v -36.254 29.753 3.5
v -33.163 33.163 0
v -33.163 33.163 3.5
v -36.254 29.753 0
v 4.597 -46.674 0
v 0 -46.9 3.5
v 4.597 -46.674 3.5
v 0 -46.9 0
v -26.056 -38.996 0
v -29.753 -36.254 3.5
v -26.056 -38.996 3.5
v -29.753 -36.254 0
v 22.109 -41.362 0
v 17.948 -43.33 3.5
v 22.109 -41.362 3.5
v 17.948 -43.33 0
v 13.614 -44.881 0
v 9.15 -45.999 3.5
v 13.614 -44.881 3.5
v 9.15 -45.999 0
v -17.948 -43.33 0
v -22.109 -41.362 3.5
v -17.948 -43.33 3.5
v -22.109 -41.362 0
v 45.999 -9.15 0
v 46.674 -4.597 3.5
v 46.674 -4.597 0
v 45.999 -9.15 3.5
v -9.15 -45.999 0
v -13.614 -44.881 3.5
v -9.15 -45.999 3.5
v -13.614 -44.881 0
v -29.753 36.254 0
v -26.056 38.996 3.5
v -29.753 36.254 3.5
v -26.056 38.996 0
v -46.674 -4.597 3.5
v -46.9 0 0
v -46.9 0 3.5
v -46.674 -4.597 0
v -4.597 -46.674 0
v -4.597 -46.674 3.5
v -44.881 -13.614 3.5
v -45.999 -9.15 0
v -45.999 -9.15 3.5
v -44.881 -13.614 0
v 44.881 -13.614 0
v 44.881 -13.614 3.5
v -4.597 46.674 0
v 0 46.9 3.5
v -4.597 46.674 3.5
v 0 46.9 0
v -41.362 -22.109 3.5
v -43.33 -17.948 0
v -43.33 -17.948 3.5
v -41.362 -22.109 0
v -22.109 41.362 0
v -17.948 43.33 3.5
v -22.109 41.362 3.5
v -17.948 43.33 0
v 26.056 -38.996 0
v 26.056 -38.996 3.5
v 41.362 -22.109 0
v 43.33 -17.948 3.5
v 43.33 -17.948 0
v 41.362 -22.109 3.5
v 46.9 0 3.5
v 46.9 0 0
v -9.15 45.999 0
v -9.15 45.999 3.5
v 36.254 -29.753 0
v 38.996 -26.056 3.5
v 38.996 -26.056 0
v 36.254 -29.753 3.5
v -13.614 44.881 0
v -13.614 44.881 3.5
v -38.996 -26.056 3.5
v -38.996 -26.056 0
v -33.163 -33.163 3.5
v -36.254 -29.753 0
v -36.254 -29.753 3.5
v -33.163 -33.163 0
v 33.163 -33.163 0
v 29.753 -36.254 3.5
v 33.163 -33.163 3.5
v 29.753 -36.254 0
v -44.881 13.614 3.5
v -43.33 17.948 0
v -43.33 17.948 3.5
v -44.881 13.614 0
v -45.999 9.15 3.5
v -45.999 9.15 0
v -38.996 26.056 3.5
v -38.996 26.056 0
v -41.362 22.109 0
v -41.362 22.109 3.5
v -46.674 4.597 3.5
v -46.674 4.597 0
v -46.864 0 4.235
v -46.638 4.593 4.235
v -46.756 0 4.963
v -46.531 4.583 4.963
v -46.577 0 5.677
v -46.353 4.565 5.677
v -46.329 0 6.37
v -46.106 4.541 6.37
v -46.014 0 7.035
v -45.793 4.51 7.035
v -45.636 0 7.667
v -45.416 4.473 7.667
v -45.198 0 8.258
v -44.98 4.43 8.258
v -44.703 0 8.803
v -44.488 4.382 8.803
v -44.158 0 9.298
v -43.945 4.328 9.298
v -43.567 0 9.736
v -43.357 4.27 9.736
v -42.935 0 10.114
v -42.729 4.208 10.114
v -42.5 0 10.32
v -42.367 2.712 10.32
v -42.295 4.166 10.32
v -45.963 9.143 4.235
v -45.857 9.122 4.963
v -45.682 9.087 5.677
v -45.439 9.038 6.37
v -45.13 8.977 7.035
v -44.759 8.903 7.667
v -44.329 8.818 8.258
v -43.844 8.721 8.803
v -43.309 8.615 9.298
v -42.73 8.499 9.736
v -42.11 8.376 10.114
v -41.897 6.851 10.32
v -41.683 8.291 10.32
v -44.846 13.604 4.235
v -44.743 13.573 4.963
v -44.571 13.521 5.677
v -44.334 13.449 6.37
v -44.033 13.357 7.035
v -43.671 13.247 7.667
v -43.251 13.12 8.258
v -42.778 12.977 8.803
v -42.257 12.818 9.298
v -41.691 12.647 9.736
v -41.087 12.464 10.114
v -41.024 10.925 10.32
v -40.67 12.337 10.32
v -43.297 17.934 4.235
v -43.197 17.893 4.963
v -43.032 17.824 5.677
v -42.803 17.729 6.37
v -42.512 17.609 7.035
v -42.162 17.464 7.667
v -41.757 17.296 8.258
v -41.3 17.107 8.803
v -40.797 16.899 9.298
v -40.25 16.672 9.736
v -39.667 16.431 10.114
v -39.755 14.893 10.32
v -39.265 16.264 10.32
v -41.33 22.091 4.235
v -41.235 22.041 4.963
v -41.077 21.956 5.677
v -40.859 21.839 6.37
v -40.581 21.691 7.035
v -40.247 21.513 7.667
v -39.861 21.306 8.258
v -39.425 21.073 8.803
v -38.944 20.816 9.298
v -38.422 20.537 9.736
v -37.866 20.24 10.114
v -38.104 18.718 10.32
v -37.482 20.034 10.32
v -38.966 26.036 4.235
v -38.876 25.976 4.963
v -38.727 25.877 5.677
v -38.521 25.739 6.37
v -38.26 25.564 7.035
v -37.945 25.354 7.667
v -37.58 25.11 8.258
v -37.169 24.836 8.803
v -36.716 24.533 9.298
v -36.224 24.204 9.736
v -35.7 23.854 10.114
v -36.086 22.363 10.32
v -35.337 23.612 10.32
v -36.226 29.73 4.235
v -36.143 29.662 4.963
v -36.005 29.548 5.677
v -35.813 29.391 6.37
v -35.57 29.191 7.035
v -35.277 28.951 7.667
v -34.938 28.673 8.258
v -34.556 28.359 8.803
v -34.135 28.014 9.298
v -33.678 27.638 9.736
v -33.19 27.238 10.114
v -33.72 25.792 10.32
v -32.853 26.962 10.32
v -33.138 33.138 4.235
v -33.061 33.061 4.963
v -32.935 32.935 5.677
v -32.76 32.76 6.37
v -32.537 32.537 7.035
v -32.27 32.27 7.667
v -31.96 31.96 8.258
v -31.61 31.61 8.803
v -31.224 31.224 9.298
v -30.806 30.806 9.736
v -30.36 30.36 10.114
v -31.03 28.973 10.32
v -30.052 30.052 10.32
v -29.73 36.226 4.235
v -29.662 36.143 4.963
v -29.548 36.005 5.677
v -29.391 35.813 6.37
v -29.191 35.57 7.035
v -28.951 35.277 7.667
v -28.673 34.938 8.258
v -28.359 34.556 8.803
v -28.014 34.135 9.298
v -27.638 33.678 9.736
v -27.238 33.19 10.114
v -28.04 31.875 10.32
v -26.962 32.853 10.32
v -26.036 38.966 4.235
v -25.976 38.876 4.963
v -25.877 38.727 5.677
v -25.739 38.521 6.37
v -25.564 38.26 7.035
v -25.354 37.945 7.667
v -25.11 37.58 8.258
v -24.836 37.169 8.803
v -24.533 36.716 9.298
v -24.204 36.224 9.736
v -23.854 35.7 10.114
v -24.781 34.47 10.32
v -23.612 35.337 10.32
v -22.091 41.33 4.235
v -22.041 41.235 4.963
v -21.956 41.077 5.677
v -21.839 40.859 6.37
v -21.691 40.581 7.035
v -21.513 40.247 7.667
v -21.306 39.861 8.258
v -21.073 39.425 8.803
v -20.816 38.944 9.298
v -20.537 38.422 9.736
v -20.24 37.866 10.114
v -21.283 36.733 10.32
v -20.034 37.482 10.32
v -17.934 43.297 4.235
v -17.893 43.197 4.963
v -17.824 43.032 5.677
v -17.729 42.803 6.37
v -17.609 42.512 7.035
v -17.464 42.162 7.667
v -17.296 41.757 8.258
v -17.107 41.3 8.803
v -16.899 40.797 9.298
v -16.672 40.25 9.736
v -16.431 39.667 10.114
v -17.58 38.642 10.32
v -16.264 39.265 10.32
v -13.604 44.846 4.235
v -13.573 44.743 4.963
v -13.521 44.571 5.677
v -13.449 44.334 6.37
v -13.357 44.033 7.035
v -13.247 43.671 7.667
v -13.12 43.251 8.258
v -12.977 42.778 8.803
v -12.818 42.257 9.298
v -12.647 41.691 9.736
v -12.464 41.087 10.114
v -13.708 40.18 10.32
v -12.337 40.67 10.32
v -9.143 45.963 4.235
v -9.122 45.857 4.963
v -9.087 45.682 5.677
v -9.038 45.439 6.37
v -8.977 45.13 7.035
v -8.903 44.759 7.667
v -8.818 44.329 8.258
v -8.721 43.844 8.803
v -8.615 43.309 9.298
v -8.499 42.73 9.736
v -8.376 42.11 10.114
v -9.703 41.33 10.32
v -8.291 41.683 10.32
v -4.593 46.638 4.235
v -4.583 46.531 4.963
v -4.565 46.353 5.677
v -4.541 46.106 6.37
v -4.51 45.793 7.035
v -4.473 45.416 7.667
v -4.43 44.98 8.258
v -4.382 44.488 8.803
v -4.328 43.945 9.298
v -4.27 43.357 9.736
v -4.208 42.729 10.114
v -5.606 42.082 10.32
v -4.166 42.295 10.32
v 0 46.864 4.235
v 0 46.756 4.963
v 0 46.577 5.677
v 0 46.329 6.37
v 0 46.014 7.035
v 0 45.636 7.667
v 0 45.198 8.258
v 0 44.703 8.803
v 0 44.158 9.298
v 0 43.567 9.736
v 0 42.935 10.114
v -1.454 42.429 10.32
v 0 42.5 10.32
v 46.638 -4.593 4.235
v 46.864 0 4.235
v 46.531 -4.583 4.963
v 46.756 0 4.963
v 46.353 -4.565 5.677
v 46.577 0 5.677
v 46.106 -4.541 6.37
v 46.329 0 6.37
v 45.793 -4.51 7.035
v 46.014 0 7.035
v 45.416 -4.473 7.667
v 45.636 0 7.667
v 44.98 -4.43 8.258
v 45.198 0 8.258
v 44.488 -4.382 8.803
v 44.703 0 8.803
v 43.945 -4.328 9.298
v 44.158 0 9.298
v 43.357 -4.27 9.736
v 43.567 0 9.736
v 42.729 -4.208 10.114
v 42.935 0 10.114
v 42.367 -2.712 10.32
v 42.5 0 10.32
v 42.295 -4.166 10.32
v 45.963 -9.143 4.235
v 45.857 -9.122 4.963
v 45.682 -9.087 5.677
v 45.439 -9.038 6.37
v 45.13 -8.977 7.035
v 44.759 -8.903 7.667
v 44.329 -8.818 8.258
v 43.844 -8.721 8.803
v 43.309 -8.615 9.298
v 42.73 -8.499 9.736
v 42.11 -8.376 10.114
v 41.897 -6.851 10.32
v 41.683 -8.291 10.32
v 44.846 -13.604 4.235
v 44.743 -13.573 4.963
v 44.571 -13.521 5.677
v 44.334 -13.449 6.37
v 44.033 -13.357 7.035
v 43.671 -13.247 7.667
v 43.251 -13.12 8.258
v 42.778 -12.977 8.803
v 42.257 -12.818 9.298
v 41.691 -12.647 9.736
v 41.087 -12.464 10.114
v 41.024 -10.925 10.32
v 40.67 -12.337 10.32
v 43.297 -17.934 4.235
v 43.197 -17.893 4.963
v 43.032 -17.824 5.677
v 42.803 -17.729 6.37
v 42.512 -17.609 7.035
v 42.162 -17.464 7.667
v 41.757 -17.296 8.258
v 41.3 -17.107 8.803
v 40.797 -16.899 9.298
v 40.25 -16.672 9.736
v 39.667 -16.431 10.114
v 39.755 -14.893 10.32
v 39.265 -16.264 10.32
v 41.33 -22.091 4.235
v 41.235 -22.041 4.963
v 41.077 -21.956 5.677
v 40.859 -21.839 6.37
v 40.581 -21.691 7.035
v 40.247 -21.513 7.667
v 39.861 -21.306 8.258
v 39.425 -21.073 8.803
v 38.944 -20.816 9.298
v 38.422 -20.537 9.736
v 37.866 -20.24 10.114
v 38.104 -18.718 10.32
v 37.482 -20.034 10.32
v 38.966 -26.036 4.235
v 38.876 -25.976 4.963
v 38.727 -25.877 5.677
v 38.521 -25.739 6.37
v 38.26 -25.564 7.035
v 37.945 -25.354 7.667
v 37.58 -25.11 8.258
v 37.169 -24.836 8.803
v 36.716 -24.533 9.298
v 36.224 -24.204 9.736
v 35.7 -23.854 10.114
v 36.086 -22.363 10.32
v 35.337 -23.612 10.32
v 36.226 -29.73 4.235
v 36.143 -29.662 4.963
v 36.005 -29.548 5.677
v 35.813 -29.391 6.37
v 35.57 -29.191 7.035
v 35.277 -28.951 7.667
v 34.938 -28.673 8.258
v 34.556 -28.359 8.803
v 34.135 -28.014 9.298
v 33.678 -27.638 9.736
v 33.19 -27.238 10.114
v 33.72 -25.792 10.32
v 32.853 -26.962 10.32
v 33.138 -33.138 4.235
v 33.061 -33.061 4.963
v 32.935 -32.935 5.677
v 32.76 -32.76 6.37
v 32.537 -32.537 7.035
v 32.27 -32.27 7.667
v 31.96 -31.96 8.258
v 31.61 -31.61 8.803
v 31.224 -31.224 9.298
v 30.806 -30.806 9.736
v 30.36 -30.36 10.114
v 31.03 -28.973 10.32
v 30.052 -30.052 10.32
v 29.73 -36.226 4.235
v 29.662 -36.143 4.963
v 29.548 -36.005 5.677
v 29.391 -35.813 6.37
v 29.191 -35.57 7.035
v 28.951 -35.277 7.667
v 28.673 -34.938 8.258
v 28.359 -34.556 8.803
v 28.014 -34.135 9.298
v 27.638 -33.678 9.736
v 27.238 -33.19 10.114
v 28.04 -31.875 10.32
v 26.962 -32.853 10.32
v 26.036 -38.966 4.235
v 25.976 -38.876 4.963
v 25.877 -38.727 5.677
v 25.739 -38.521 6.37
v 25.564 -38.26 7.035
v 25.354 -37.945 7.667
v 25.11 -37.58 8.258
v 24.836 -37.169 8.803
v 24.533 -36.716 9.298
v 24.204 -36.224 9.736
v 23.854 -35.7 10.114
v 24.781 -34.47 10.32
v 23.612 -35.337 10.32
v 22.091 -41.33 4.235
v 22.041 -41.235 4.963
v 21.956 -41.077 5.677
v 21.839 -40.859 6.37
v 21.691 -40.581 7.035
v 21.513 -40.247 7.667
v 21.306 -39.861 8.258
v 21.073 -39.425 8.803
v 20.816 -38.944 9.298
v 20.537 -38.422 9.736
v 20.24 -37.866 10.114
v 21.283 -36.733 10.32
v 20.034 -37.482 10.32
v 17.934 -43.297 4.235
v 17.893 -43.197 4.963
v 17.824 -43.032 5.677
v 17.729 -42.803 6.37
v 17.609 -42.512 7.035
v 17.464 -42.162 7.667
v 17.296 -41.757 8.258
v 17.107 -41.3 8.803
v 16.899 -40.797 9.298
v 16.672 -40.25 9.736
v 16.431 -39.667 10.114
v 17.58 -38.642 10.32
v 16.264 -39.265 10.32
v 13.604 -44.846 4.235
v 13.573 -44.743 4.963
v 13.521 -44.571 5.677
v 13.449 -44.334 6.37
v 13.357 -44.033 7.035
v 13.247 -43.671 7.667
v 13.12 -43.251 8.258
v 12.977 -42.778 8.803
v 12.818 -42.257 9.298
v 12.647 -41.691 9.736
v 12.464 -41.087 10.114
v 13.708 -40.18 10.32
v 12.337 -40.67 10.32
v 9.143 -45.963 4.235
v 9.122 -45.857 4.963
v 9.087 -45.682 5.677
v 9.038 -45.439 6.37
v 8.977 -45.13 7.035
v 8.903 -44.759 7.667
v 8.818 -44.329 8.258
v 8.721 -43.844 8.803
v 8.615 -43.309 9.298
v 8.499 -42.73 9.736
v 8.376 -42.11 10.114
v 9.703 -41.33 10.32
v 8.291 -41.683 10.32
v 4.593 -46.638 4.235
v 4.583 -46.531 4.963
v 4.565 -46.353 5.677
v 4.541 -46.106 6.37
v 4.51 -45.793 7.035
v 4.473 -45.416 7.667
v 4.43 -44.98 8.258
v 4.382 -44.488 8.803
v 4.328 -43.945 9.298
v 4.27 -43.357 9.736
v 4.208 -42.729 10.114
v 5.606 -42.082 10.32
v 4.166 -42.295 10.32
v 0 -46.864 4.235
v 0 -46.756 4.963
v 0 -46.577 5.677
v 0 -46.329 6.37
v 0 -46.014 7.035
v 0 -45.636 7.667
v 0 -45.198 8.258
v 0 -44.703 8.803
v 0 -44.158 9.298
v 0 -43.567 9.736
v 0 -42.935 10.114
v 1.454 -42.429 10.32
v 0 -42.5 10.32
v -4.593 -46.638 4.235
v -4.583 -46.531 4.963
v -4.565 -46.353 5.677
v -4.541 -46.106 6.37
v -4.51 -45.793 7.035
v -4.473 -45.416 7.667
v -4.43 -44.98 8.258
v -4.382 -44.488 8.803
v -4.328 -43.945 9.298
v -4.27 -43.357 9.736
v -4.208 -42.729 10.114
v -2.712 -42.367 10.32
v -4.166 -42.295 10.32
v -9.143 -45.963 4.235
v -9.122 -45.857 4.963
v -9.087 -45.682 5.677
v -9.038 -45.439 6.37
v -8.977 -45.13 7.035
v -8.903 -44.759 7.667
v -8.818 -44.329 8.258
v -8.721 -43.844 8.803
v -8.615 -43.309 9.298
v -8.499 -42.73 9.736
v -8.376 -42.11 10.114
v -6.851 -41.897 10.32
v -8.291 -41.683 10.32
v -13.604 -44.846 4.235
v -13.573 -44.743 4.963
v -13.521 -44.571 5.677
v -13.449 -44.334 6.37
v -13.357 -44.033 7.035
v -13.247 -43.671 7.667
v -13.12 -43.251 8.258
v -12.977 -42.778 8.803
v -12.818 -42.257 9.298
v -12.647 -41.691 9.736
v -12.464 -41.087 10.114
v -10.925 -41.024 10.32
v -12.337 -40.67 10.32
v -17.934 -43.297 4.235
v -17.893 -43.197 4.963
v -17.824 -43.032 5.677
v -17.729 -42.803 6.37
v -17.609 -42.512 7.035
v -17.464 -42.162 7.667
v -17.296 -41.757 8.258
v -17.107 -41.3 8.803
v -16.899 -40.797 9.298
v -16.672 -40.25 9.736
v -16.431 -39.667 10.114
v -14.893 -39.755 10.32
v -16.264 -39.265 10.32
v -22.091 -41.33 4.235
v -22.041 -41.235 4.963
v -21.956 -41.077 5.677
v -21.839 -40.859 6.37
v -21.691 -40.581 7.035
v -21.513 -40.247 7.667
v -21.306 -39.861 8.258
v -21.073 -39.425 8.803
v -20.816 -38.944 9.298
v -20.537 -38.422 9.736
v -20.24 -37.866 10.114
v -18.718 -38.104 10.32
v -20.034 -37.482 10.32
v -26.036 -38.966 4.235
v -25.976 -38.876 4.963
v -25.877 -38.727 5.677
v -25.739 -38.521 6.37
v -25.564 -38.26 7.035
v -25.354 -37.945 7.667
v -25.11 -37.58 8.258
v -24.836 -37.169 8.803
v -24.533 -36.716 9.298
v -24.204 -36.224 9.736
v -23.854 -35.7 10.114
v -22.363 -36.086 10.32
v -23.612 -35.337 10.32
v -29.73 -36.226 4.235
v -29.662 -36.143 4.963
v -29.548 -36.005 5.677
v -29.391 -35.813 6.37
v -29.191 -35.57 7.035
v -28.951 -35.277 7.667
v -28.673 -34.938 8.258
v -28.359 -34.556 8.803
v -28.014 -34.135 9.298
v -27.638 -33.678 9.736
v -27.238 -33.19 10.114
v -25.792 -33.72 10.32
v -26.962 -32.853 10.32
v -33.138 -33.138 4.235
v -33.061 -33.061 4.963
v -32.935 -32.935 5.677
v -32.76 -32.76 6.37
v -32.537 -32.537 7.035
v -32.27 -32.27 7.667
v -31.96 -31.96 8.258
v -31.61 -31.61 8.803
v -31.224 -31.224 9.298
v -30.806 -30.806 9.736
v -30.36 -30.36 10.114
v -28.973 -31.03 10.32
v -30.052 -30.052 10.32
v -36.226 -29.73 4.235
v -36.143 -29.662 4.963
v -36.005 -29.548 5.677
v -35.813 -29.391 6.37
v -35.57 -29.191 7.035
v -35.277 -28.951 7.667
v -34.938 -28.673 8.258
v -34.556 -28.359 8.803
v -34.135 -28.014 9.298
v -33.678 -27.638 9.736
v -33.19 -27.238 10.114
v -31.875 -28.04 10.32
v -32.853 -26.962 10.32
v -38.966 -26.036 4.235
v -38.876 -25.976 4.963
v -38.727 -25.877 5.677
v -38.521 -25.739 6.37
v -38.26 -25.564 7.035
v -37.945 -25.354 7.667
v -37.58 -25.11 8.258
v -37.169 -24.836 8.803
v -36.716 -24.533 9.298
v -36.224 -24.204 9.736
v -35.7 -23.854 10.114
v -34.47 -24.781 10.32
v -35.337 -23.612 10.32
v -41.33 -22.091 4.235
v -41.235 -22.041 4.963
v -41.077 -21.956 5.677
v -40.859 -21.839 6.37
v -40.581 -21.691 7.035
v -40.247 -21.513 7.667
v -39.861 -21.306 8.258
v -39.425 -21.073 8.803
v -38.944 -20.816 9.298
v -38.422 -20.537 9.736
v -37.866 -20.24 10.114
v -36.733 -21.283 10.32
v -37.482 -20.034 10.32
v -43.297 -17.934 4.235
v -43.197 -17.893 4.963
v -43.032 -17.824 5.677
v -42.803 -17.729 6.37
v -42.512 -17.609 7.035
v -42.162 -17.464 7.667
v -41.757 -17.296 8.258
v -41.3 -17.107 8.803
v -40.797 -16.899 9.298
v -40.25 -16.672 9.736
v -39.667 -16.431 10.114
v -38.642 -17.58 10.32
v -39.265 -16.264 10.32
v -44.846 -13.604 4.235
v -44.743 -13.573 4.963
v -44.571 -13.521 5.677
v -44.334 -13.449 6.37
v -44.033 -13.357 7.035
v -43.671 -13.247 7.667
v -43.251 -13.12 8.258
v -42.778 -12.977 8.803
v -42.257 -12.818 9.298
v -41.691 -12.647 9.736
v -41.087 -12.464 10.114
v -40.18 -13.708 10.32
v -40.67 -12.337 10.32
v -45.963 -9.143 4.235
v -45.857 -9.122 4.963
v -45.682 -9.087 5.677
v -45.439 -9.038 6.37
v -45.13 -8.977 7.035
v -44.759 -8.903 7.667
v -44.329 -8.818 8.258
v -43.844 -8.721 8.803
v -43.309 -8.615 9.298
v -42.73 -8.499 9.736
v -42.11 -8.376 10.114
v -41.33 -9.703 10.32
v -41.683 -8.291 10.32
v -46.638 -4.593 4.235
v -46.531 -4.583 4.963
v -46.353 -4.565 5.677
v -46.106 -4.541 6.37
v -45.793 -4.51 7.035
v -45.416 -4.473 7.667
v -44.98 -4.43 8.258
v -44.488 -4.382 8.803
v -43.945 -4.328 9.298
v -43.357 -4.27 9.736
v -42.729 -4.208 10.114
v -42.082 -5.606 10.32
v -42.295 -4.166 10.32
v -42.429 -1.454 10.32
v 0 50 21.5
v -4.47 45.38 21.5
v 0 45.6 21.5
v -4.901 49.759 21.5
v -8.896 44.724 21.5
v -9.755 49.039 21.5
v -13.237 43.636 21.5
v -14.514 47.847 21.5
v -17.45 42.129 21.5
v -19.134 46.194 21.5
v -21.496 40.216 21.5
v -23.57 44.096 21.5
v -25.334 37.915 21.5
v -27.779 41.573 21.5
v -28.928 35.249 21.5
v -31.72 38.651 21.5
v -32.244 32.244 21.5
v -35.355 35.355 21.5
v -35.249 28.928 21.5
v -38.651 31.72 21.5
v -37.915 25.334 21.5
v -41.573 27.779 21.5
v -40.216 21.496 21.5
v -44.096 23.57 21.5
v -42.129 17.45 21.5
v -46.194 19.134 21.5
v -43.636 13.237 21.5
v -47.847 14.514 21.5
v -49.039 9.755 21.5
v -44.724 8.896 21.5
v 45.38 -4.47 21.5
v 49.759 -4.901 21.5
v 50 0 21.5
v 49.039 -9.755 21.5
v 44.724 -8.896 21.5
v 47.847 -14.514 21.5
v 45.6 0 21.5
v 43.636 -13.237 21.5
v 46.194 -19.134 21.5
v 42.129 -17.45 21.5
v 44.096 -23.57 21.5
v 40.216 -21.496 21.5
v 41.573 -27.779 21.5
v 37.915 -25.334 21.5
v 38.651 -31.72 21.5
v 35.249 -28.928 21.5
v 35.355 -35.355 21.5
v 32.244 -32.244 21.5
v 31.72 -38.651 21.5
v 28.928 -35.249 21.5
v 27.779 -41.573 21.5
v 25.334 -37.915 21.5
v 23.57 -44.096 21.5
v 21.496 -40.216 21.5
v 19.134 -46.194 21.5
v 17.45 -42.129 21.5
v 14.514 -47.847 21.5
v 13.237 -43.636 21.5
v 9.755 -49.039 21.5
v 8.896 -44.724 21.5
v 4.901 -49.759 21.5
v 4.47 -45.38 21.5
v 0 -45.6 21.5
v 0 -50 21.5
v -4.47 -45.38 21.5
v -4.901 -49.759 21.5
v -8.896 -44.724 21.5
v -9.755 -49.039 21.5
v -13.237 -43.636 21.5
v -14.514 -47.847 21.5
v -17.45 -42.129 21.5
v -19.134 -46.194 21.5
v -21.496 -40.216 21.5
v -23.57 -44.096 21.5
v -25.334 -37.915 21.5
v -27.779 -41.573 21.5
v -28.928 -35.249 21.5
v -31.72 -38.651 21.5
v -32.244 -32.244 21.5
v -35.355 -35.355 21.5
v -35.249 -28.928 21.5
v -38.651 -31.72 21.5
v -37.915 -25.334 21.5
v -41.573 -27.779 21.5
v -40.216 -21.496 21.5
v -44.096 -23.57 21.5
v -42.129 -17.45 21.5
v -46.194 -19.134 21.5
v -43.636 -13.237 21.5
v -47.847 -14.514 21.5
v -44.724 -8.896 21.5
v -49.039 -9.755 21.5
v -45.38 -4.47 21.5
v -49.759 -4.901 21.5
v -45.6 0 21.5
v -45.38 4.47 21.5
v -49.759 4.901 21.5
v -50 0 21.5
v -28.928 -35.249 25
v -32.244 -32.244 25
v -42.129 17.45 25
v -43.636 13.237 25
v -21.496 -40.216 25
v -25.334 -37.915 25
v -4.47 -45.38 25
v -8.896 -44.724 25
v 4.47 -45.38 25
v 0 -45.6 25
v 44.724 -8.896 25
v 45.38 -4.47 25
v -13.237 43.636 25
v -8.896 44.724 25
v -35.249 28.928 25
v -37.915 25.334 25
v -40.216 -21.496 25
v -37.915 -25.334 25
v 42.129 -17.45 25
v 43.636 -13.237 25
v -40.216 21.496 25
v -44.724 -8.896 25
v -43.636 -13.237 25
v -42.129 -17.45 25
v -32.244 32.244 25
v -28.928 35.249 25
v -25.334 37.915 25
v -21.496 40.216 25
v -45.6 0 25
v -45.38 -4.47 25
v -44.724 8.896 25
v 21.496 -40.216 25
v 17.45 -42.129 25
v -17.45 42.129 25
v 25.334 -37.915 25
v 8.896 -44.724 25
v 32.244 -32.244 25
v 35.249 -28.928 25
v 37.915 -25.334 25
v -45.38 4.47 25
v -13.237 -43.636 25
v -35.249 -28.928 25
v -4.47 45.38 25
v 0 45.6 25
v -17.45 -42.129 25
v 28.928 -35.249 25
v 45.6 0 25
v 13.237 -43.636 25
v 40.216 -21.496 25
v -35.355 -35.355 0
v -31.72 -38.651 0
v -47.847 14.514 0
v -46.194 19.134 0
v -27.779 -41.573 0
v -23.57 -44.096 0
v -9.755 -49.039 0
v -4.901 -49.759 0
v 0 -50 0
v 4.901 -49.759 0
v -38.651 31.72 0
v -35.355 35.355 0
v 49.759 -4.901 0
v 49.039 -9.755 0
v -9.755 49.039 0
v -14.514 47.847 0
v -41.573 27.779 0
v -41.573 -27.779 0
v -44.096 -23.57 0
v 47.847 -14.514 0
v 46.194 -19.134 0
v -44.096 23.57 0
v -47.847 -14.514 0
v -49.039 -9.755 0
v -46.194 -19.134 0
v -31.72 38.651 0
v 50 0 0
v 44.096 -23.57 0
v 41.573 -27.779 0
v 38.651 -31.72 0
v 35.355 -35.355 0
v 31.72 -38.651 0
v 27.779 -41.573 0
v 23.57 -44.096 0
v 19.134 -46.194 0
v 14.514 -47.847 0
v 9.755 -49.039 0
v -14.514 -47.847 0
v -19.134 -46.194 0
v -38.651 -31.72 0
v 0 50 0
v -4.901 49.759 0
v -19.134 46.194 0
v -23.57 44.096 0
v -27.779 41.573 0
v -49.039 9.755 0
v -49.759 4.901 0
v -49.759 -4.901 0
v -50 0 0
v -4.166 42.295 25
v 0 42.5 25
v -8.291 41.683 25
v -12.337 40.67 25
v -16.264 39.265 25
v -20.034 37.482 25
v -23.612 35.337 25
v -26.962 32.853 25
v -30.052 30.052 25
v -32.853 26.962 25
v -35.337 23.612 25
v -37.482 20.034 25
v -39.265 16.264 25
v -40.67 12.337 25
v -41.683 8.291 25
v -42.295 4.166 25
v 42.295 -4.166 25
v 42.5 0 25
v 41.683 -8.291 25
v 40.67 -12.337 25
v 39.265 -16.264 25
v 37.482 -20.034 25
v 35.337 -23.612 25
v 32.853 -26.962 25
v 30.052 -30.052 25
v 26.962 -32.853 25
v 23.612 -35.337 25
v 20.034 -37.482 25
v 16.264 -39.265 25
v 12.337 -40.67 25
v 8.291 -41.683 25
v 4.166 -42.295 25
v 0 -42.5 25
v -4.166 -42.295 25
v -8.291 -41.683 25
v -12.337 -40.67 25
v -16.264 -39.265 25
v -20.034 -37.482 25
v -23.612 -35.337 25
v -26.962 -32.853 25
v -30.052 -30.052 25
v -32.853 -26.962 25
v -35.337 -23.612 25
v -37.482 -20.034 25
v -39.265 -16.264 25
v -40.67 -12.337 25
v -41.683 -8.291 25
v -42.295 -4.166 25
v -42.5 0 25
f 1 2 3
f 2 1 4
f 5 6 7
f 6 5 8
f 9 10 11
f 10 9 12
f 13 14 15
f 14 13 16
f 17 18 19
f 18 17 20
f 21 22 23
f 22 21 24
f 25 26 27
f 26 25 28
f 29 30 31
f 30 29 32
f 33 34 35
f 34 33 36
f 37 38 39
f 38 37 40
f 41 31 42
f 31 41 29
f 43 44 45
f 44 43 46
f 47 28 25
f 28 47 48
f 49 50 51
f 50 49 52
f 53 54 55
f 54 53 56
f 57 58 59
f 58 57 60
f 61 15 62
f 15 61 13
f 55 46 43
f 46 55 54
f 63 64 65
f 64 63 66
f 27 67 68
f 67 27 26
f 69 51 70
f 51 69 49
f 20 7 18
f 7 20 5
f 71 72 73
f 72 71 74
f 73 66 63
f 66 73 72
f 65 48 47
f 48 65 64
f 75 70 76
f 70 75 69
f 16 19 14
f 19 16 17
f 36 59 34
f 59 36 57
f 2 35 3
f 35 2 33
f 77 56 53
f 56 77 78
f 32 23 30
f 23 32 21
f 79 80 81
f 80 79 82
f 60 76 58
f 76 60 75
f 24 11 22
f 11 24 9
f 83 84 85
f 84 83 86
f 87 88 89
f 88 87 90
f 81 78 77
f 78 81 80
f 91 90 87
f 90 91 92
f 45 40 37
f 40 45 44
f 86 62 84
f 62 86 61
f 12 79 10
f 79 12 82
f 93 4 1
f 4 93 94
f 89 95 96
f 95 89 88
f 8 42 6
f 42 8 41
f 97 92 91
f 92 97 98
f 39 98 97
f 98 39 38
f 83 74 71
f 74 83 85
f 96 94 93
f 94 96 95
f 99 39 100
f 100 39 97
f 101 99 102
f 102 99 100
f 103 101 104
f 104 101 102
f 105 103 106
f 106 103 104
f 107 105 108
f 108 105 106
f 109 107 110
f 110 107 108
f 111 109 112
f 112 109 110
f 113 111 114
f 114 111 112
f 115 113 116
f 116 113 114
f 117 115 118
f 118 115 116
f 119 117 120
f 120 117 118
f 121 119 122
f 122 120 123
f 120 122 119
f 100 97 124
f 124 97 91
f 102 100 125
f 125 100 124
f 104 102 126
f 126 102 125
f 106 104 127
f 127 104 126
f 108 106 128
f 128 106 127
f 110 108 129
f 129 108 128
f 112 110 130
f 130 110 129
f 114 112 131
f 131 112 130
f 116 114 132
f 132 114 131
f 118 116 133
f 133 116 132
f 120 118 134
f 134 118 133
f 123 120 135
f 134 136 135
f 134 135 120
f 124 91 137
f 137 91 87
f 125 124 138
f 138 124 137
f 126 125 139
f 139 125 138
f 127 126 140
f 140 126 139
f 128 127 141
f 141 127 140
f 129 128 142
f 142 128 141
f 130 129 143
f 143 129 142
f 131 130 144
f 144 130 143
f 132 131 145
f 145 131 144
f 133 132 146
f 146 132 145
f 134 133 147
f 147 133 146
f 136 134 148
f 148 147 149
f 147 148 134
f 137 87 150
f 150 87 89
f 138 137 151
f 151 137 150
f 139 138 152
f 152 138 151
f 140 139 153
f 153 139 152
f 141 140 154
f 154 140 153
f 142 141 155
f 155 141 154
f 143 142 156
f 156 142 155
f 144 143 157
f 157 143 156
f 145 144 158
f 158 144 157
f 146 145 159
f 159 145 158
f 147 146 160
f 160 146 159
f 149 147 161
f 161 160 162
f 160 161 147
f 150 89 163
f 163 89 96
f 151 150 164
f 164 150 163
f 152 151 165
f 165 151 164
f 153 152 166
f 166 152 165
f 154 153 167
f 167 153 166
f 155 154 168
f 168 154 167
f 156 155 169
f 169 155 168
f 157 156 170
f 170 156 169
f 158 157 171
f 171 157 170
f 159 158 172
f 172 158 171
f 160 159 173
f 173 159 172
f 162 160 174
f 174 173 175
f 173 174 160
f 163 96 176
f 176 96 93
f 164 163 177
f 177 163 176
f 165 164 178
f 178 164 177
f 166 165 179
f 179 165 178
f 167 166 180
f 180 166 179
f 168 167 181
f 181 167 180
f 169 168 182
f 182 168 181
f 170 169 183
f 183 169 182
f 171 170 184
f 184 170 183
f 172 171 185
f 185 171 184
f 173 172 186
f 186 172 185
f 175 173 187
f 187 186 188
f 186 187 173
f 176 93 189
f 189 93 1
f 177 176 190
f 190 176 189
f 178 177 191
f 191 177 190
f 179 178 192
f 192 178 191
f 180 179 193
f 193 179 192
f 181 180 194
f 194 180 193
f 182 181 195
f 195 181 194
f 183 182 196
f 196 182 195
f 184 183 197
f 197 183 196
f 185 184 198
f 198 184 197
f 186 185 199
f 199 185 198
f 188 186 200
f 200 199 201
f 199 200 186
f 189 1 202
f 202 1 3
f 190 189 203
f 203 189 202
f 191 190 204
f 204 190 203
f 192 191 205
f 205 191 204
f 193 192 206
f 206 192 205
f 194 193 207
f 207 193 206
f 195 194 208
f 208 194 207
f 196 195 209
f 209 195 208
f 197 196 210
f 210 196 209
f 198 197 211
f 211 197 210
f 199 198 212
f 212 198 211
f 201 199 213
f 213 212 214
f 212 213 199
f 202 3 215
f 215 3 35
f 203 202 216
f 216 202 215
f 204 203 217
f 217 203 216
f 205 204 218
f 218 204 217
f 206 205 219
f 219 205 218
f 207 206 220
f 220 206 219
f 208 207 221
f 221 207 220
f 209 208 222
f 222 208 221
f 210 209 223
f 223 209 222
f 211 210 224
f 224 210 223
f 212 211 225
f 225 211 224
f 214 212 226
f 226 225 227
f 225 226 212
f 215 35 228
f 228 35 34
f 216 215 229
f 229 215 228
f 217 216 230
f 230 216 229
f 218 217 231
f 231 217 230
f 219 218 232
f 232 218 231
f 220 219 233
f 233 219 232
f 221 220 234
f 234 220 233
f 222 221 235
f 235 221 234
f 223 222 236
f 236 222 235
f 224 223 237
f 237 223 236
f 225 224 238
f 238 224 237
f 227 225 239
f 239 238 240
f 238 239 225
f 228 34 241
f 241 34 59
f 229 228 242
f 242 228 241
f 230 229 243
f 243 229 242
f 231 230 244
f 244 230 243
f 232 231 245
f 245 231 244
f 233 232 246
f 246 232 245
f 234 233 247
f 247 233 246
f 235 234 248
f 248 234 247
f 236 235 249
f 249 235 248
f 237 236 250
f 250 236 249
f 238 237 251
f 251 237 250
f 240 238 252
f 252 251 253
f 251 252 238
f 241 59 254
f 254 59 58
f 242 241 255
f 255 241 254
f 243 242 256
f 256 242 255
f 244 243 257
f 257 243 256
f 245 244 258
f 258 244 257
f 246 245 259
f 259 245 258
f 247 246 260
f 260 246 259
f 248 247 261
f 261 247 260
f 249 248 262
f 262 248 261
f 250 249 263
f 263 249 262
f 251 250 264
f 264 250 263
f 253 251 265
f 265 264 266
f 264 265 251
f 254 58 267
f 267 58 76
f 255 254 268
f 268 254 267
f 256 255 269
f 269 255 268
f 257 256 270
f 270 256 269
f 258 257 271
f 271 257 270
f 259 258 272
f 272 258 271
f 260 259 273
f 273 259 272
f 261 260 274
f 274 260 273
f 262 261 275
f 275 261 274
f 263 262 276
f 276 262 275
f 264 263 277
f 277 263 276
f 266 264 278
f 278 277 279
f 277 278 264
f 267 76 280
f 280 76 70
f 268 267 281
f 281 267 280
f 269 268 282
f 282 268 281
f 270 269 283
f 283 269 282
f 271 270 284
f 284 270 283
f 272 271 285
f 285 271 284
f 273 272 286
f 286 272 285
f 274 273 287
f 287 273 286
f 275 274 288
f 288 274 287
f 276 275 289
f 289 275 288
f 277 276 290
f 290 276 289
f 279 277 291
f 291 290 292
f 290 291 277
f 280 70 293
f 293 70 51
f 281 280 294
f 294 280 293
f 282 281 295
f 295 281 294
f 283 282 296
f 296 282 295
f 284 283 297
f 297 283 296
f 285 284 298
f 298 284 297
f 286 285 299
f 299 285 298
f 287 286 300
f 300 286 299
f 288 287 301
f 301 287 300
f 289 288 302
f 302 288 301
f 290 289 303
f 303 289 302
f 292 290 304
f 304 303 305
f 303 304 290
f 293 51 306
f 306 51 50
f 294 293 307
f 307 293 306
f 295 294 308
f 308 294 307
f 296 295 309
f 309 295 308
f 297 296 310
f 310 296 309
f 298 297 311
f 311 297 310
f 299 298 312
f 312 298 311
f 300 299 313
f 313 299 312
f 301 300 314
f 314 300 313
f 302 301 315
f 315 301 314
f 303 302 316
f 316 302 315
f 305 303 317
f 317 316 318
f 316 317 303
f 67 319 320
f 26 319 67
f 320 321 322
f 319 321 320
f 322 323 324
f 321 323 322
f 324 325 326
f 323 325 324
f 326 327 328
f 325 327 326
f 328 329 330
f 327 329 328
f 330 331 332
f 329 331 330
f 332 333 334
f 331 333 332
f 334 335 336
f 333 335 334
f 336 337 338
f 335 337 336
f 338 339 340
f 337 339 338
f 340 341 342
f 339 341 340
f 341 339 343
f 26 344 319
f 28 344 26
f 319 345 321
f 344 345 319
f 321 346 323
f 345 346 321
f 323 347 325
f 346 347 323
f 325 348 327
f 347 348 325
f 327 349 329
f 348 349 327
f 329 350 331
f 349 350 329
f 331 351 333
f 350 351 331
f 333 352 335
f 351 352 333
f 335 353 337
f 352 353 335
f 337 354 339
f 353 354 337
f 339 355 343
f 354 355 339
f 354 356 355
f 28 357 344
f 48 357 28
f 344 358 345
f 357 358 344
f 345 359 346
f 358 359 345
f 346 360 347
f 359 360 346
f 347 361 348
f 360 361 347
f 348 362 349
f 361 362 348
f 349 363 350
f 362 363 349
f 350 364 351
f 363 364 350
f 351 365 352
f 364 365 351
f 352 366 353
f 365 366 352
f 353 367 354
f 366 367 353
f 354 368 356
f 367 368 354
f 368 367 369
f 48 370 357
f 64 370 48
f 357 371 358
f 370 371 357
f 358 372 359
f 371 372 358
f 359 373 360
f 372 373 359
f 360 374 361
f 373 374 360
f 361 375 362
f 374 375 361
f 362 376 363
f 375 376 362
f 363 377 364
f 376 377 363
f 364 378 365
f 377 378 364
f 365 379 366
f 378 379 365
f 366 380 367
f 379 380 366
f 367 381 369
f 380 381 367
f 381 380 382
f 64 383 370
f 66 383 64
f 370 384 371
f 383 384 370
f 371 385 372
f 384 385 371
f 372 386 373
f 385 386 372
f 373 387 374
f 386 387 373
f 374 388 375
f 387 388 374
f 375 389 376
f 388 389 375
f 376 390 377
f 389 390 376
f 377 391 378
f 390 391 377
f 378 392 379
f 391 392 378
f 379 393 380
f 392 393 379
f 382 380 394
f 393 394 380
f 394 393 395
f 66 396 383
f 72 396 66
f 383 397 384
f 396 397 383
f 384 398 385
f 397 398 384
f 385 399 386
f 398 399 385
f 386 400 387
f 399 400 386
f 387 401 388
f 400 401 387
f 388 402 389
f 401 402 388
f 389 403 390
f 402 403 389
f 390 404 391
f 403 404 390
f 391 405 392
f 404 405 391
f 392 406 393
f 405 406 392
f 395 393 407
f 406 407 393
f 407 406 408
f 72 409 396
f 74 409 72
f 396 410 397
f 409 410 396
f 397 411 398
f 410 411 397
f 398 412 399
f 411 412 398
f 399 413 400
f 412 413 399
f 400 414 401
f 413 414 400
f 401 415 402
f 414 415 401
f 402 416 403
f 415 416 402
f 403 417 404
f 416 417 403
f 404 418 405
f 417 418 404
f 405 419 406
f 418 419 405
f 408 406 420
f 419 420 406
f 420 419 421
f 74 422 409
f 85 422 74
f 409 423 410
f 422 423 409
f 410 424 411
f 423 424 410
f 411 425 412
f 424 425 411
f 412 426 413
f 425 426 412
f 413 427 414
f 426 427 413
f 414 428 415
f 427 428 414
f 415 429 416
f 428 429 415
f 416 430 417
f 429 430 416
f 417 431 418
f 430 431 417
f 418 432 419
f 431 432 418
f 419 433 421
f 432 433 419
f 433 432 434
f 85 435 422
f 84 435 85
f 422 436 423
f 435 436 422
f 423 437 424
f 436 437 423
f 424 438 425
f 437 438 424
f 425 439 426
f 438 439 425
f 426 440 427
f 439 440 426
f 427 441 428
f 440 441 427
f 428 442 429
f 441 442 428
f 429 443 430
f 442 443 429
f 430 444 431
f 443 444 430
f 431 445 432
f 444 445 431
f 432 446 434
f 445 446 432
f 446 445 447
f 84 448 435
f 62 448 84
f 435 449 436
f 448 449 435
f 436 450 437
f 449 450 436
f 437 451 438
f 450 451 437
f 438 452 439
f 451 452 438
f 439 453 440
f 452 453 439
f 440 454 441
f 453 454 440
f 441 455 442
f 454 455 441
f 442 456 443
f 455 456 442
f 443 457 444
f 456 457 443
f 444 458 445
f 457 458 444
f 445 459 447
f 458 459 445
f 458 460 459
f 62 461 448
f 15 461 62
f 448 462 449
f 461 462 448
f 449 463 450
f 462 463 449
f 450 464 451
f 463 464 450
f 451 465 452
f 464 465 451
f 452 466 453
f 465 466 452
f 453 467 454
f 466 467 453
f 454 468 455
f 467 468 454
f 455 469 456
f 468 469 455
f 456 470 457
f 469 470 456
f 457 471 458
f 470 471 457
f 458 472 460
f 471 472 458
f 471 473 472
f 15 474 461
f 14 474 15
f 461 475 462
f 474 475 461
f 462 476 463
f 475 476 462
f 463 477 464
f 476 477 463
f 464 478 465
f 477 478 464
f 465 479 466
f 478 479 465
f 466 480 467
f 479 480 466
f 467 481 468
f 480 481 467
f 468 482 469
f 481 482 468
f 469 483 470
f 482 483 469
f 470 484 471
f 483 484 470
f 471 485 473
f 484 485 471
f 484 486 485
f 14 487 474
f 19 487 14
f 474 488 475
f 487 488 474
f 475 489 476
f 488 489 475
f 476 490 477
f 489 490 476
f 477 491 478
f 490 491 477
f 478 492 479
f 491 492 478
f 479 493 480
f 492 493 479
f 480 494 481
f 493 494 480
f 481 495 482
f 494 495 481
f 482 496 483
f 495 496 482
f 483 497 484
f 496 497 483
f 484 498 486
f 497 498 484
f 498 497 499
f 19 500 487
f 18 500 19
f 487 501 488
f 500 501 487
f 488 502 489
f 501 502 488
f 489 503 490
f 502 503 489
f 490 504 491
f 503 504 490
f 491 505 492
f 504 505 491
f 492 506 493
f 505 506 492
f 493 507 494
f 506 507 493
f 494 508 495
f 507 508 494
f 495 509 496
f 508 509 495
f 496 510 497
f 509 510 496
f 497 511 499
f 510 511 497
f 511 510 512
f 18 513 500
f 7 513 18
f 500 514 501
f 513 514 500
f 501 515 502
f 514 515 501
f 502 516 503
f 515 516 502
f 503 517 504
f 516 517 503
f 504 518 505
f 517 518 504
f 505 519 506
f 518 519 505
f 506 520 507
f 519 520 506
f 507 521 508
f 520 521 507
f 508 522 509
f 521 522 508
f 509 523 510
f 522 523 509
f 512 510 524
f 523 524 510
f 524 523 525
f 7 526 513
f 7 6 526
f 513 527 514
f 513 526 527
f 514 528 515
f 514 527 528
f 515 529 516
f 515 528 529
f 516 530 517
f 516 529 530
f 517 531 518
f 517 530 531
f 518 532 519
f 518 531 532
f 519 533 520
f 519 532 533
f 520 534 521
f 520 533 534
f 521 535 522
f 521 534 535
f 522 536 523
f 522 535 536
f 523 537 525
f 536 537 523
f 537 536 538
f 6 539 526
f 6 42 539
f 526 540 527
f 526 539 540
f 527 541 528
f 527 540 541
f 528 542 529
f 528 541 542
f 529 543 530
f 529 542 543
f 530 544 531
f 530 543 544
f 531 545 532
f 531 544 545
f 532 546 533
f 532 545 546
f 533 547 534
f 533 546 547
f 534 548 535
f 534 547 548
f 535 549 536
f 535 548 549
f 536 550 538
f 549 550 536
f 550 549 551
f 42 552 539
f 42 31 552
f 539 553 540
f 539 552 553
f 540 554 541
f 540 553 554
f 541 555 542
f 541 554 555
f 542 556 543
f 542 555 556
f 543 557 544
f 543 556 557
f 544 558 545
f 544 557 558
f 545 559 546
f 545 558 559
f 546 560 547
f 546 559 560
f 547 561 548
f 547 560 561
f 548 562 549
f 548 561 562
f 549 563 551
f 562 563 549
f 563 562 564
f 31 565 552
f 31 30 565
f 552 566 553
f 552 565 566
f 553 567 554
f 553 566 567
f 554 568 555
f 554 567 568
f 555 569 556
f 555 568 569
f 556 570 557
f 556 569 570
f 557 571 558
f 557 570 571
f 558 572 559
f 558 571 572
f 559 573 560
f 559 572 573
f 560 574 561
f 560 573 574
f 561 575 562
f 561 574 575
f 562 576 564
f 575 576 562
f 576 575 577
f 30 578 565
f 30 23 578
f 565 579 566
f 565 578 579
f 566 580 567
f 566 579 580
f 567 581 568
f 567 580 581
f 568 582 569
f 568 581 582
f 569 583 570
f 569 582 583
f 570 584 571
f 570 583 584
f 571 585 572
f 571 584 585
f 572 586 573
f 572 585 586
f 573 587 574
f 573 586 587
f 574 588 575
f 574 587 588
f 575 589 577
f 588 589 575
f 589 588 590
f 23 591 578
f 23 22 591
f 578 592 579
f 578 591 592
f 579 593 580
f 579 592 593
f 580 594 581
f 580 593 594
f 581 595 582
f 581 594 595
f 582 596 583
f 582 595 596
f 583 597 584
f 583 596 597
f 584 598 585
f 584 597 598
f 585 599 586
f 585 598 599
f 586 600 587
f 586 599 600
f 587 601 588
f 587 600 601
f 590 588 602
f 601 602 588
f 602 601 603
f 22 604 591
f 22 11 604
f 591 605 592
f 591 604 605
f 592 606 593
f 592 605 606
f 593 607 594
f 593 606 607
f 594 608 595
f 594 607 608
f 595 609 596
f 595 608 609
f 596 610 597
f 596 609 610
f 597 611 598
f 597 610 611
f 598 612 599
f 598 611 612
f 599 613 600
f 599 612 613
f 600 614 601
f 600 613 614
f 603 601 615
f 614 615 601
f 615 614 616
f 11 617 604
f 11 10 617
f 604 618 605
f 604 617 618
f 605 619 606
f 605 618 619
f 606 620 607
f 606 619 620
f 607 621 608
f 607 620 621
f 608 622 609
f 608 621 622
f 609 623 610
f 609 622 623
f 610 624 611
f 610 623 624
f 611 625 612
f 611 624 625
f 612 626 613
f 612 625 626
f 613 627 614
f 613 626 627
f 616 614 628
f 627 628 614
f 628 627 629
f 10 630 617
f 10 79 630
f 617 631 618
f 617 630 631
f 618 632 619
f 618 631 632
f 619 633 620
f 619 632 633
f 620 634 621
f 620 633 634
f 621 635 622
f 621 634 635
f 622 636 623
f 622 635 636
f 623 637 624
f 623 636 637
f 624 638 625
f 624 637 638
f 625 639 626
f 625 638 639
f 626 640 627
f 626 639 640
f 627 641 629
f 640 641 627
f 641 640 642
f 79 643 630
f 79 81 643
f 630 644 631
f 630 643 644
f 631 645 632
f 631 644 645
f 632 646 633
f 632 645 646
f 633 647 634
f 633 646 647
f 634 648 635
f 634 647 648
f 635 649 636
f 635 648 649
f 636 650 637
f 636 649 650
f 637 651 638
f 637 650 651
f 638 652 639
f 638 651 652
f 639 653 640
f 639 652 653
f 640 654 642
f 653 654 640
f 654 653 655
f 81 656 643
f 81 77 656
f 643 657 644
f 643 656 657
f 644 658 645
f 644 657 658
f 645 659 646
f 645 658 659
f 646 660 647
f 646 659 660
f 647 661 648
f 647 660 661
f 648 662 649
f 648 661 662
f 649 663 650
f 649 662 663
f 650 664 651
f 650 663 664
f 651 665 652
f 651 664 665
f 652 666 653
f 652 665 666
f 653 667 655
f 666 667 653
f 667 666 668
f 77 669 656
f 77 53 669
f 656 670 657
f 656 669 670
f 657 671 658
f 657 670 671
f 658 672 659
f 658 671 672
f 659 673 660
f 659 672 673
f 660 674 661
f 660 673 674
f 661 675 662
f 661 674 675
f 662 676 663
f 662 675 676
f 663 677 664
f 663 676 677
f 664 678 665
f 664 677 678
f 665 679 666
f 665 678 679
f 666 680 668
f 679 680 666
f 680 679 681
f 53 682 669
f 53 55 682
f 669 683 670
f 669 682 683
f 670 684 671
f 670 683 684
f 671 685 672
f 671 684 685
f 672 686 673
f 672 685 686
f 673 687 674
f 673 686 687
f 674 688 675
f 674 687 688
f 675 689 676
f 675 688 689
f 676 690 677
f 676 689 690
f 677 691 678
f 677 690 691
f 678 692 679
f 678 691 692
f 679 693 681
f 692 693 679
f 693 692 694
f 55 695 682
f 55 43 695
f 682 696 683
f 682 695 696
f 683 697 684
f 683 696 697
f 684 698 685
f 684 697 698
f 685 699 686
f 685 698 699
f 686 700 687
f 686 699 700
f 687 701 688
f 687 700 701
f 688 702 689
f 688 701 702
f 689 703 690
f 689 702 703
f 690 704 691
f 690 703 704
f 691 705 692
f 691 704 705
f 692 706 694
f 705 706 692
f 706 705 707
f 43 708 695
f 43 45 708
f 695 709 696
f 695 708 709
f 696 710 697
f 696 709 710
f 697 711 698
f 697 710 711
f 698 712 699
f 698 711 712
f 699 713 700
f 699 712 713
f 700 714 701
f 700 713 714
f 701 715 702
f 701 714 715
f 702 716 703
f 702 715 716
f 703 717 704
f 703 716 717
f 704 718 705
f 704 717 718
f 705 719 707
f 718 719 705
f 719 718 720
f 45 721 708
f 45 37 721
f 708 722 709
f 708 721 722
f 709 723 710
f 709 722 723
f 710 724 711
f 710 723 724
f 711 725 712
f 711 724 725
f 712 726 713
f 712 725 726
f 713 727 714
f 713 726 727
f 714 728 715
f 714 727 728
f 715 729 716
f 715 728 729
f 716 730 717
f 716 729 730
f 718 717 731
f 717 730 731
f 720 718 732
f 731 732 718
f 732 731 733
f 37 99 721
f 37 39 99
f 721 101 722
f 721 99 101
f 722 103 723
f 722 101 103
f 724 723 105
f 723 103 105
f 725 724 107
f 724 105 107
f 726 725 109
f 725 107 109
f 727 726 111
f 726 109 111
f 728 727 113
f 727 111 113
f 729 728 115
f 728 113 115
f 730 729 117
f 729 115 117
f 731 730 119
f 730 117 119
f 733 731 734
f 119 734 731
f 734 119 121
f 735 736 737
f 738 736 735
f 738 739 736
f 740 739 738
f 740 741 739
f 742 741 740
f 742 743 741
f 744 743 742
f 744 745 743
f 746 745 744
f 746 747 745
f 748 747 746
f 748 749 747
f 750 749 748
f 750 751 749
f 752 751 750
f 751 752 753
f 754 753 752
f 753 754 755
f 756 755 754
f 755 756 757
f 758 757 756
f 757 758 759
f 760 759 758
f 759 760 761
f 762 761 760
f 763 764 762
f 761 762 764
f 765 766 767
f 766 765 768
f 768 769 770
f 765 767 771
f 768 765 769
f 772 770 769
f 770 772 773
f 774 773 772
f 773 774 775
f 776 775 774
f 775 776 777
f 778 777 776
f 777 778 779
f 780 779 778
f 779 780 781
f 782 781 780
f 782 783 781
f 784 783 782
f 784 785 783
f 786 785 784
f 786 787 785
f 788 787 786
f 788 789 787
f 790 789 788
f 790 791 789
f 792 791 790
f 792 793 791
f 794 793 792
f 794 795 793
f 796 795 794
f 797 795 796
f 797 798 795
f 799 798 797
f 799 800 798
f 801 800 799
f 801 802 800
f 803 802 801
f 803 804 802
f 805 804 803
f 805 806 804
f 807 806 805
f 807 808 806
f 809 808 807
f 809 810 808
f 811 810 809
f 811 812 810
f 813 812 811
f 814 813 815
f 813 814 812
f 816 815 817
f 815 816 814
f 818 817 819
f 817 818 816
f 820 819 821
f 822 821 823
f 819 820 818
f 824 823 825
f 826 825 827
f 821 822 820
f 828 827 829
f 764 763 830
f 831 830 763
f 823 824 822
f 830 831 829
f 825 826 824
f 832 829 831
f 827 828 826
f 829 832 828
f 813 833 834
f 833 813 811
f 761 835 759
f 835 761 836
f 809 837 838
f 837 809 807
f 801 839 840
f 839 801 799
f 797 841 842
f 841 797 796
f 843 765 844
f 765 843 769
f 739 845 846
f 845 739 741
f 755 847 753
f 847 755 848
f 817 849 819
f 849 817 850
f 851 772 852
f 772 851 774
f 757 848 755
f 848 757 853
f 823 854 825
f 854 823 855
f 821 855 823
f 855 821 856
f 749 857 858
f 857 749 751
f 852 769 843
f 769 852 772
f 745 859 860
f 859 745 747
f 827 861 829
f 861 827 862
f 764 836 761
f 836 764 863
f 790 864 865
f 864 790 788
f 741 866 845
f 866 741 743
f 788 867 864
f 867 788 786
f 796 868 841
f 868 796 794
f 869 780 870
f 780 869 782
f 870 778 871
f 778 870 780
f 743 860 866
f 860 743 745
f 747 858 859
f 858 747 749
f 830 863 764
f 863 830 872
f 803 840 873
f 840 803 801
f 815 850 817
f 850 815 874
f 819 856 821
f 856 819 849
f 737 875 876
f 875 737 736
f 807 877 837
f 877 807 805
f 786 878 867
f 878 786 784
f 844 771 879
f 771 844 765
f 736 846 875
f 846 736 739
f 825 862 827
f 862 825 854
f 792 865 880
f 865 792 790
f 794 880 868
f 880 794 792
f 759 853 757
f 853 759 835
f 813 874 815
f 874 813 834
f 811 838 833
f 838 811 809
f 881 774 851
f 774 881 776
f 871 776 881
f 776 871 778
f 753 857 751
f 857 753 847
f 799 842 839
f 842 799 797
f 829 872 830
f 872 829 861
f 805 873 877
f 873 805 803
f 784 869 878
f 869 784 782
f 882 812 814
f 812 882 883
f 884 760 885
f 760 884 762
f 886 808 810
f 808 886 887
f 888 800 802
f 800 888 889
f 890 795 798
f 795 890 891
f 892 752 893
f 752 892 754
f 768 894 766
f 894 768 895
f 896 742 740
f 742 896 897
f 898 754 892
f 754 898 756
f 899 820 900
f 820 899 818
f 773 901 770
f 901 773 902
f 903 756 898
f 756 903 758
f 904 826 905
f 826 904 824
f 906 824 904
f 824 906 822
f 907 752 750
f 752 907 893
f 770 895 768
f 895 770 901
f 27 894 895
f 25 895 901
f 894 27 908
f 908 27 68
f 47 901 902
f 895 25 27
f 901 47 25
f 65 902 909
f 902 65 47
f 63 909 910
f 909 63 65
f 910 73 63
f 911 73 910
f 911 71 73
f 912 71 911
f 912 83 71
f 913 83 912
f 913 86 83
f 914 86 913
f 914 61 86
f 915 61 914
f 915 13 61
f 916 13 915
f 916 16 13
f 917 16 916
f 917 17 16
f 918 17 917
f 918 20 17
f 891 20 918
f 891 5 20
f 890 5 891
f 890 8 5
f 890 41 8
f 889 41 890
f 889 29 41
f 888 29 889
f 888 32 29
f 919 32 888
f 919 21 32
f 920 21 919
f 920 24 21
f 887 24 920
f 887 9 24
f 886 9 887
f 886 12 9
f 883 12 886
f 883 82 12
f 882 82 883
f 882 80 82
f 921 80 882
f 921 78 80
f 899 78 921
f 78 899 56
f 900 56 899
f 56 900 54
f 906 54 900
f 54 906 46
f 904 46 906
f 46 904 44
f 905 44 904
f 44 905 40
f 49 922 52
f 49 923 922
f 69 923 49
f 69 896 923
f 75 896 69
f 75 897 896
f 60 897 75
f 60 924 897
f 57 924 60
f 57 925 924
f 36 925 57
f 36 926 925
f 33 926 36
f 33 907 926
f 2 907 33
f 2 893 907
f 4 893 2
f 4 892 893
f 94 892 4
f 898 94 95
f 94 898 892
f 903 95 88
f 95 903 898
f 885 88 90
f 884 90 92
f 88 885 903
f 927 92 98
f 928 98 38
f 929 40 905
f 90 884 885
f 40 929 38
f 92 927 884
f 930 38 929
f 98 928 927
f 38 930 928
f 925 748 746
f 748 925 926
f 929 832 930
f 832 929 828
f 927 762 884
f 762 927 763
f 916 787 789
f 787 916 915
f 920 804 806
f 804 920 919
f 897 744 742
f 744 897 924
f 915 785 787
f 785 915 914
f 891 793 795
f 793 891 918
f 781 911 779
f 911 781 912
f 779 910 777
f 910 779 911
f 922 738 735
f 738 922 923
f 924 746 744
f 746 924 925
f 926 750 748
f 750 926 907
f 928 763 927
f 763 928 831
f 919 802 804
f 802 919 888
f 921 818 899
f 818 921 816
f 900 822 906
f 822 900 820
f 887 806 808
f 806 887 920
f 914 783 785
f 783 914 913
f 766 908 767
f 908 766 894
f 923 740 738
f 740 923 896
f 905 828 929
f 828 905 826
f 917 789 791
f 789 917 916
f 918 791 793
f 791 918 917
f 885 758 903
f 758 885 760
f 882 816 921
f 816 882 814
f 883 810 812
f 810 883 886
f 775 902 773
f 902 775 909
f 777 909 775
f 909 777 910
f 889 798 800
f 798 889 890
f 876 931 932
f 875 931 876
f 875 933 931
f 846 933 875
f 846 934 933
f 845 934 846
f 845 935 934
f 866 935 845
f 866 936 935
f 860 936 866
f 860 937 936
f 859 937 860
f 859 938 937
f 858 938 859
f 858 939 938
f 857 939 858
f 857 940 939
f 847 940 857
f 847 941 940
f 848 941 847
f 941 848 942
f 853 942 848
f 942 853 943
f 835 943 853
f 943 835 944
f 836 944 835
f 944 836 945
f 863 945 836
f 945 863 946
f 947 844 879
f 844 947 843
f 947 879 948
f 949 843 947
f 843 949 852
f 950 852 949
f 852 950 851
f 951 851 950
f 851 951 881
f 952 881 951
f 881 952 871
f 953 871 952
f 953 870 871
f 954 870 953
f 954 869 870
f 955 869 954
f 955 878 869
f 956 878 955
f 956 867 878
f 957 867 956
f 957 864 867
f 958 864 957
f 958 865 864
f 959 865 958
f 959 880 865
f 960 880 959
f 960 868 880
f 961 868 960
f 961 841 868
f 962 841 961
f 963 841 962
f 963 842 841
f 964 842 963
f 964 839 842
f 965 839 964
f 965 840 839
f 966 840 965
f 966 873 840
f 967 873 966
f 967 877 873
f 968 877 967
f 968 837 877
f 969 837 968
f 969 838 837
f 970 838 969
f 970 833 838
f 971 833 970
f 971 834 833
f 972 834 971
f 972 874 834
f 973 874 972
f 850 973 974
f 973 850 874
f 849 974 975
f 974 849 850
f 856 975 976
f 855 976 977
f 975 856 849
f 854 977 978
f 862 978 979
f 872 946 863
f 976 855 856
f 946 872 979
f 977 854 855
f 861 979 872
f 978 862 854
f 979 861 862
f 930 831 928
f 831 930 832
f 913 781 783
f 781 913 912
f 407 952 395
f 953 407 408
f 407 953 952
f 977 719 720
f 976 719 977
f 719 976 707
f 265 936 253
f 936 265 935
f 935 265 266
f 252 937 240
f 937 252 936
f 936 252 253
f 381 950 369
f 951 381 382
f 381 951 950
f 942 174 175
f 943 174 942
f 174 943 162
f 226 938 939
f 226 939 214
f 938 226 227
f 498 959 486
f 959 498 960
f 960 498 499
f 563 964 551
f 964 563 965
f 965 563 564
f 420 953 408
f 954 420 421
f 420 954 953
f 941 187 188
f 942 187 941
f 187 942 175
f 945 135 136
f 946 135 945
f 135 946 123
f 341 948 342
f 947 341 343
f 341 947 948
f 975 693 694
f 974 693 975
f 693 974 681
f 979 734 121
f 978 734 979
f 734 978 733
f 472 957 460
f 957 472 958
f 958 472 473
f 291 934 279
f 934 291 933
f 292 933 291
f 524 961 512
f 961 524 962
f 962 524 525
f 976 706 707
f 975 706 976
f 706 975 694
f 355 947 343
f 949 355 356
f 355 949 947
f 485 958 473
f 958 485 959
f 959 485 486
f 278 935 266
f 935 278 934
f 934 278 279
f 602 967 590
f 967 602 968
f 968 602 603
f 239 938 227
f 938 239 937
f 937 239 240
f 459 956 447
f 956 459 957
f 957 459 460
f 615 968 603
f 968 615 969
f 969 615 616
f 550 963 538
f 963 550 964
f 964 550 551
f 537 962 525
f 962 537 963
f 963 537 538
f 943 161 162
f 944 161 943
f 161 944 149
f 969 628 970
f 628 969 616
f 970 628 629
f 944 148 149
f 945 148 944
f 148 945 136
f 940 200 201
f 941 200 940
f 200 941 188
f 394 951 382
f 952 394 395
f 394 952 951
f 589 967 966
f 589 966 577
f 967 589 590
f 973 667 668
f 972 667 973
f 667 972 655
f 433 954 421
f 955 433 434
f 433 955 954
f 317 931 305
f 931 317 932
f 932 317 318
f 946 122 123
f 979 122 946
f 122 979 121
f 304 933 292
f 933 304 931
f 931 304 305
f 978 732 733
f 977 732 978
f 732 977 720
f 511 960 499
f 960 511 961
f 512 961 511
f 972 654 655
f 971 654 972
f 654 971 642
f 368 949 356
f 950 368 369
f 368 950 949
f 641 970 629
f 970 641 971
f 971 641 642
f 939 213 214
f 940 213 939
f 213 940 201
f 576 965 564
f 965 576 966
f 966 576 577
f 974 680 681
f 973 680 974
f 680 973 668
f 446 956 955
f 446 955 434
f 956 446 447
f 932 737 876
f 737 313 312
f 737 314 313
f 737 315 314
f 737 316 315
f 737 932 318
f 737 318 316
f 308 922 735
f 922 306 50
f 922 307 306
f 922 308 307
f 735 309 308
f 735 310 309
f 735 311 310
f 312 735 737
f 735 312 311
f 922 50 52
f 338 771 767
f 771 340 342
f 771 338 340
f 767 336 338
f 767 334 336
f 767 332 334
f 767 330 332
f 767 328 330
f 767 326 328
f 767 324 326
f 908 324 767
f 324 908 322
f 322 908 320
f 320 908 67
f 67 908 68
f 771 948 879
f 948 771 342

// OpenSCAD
difference(){
    cylinder(h=25, r=50.0, $fn=64);
    translate(v=[0, 0, -12.5]){
        cylinder(h=50, r=42.5, $fn=64);
    };
    union(){
        translate(v=[0, 0, -1]){
            cylinder(h=4.5, r=46.9, $fn=64);
        };
        translate(v=[0, 0, 3.5]){
            rotate_extrude(convexity=10, $fn=64){
                translate(v=[39.4, 0, 0]){
                    circle(r=7.5, $fn=64);
                };
            };
        };
    };
    translate(v=[0, 0, 21.5]){
        difference(){
            cylinder(h=4.5, r=51.0, $fn=64);
            translate(v=[0, 0, -1]){
                cylinder(h=5.5, r=45.6, $fn=64);
            };
        };
    };
    translate(v=[0, 0, -1]){
        cube(size=[100, 100, 100]);
    };
};
